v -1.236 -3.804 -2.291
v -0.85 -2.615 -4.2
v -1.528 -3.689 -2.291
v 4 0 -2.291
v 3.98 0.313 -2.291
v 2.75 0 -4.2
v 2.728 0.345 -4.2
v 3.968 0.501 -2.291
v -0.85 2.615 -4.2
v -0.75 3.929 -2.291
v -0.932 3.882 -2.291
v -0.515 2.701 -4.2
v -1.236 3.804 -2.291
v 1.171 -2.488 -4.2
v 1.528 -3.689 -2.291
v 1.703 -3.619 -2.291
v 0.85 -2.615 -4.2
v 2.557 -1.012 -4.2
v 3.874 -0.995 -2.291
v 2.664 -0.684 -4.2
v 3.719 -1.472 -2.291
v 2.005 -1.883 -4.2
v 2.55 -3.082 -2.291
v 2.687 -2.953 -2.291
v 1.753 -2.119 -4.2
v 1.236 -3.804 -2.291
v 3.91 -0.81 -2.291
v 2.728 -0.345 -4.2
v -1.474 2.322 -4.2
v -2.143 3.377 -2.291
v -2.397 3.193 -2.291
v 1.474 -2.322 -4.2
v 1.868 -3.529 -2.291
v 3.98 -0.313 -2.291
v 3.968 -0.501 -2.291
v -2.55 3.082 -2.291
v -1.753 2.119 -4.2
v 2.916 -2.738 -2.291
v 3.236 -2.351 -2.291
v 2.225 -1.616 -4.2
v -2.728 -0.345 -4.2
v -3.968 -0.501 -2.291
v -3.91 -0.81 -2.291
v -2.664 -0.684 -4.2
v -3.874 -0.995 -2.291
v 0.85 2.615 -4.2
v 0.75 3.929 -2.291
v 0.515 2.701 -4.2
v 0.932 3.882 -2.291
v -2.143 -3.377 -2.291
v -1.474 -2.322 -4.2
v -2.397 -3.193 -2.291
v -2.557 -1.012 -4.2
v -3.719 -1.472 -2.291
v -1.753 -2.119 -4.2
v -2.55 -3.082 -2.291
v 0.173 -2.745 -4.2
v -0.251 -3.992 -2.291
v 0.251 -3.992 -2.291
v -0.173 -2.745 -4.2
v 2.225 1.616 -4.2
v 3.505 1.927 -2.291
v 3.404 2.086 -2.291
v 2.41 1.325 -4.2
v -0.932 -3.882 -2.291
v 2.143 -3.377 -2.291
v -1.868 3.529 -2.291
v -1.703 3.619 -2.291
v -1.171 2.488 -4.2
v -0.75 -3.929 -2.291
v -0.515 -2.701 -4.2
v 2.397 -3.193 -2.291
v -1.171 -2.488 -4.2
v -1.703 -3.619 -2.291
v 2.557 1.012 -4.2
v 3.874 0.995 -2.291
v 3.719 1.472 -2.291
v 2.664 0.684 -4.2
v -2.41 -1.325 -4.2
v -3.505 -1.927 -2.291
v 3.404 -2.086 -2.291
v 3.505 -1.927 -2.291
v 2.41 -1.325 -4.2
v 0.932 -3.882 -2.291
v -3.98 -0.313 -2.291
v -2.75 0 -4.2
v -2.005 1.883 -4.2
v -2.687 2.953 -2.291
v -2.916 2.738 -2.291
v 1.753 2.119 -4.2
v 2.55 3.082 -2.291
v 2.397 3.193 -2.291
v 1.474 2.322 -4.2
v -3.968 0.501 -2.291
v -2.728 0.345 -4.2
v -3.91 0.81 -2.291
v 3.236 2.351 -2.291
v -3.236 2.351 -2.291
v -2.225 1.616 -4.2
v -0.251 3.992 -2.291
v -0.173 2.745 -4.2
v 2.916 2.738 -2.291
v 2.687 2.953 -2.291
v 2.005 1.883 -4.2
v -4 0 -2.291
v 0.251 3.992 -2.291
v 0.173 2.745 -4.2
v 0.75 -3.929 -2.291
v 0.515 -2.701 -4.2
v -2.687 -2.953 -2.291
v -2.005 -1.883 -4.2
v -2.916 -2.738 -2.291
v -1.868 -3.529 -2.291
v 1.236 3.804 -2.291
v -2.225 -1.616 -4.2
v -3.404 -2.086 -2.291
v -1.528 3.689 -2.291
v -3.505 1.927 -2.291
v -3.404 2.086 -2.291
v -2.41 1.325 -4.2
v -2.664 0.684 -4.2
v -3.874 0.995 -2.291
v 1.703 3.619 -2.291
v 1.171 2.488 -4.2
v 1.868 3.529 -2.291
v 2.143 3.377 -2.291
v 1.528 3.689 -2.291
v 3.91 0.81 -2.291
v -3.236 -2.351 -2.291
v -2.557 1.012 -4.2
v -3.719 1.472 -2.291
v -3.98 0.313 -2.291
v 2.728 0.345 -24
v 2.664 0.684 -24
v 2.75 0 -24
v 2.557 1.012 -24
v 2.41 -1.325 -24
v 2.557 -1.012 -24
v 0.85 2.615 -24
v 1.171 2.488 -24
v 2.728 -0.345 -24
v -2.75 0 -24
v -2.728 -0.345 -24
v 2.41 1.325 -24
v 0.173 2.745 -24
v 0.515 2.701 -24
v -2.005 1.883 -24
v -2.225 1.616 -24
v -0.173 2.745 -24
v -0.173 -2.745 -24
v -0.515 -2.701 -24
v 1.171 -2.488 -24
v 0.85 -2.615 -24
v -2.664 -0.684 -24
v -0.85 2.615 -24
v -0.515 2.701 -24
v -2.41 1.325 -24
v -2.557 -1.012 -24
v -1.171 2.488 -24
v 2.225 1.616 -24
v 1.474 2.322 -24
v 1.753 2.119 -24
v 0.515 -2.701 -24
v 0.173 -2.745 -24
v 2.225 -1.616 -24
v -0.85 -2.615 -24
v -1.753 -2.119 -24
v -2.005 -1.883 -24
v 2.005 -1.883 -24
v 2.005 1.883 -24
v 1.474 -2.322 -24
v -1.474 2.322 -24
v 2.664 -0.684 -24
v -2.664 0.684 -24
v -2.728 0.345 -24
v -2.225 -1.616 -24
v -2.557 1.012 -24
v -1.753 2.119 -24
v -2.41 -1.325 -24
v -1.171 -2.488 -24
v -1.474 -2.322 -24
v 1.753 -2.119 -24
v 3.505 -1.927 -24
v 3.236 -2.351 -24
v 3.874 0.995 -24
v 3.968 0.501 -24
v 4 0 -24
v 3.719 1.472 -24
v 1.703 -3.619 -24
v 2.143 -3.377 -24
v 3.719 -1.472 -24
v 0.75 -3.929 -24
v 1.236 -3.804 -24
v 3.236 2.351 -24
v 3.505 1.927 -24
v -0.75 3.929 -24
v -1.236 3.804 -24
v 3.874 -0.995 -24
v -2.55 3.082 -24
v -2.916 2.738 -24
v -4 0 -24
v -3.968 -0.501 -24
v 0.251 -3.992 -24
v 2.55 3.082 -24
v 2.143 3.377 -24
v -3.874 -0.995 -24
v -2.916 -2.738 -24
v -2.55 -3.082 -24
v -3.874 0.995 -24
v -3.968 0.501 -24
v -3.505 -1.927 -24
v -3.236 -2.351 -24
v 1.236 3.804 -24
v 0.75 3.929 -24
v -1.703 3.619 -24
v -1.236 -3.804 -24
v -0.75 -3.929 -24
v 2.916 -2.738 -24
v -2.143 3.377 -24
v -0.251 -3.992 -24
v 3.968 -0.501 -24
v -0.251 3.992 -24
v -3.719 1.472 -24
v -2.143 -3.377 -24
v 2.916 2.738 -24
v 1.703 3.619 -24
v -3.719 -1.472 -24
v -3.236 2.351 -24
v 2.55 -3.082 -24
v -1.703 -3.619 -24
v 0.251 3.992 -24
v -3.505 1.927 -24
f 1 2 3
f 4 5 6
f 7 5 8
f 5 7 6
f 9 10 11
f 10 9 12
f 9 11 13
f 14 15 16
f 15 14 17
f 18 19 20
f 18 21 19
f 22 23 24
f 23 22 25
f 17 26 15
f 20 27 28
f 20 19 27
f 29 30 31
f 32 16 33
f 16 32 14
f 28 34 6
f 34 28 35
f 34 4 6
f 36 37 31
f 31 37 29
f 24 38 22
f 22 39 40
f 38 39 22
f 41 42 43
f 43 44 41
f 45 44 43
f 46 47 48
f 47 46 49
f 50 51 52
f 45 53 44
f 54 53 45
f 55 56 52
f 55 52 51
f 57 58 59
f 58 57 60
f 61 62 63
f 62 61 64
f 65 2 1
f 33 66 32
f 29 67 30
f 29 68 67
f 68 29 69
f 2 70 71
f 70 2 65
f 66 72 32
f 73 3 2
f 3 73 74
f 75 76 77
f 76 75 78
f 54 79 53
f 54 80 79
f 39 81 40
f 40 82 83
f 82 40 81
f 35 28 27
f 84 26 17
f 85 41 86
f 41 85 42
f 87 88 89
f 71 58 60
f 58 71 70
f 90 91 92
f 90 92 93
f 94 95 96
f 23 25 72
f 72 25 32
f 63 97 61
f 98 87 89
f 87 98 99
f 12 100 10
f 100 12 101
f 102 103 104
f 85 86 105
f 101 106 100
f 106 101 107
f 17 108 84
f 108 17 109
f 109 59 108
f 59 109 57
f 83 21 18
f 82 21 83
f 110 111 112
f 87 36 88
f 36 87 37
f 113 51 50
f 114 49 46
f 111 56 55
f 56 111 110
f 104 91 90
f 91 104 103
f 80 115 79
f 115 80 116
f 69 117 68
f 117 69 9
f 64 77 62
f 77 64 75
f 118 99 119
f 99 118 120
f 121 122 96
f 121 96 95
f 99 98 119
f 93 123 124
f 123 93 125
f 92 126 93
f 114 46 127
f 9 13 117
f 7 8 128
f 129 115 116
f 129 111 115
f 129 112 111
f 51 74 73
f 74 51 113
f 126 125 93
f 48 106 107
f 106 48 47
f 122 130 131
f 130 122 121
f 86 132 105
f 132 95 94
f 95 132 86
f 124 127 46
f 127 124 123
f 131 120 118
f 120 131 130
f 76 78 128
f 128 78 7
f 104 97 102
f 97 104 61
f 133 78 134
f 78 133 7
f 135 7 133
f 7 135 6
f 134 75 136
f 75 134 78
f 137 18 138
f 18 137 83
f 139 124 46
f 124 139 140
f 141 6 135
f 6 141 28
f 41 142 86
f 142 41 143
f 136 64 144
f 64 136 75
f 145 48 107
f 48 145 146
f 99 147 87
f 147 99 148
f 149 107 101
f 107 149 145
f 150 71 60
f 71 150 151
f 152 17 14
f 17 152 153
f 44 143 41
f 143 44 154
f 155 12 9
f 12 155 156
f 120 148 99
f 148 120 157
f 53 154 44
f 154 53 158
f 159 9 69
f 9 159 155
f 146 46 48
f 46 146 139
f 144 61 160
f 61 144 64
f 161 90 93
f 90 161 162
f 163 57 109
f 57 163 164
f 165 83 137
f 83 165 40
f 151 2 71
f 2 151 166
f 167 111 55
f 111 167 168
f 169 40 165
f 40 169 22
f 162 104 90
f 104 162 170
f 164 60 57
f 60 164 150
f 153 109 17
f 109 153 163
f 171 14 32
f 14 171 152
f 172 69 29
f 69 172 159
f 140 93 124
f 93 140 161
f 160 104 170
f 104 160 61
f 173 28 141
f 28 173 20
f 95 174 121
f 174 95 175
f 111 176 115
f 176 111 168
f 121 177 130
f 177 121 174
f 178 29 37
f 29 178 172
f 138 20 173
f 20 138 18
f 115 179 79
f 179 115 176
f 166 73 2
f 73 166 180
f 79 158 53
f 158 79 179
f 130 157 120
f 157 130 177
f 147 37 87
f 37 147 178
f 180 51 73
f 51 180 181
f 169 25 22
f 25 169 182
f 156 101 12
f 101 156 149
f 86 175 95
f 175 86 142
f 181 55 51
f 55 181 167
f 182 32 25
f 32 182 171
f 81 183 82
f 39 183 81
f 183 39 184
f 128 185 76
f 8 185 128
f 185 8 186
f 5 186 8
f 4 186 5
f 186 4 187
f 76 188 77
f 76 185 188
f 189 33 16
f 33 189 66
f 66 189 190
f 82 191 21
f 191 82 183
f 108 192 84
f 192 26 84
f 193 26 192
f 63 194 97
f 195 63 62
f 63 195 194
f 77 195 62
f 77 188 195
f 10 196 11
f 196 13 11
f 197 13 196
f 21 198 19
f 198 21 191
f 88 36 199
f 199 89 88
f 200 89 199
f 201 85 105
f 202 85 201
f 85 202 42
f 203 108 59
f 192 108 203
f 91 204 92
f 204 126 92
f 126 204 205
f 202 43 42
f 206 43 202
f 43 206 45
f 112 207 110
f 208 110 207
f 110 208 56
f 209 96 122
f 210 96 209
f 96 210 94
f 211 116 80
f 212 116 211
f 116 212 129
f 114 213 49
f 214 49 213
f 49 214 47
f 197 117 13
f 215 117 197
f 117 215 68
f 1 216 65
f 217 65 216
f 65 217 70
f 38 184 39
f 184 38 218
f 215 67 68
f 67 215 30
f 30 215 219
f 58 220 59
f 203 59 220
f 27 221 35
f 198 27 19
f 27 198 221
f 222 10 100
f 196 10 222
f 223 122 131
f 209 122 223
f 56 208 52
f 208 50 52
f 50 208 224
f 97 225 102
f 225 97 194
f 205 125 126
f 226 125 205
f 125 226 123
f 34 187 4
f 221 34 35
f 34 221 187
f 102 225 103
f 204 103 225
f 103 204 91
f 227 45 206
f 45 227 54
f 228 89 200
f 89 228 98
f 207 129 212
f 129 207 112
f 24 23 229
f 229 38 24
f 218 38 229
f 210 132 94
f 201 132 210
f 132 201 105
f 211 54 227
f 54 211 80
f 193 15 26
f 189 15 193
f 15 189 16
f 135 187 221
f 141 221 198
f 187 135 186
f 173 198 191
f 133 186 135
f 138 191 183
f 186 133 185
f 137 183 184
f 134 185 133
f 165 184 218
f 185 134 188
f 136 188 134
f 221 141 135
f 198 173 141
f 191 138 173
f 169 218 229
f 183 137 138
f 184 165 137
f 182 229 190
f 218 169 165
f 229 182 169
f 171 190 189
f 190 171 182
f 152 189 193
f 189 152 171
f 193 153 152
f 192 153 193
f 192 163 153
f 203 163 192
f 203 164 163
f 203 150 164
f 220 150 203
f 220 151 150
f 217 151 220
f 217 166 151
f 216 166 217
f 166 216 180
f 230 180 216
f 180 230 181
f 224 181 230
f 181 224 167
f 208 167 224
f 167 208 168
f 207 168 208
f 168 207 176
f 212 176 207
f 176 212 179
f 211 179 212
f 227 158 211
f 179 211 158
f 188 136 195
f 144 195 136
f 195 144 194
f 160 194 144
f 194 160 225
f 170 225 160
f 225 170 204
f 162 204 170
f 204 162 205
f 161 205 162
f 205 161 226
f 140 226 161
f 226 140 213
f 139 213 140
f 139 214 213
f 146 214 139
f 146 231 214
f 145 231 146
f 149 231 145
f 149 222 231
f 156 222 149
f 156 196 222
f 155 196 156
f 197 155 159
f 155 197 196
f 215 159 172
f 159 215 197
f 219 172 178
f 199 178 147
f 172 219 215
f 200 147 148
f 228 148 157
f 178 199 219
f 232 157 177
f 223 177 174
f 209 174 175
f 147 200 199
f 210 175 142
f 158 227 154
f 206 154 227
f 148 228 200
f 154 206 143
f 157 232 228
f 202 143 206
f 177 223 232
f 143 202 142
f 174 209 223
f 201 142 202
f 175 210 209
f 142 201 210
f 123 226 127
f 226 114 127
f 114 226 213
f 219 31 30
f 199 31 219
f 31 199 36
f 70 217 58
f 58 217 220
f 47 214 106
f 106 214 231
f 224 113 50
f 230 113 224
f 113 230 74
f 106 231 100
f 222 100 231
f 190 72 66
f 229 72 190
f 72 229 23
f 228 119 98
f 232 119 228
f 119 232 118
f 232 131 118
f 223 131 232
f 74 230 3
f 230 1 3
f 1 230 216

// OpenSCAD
$fn = 50;

difference() {
	union() {
		translate(v = [0, 0, -24.0]) {
			cylinder(h = 27, r = 4.0);
		}
	}
	union() {
		translate(v = [0, 0, 0]) {
			rotate(a = [0, 0, 0]) {
				difference() {
					union() {
						translate(v = [0, 0, -27.0]) {
							cylinder(h = 27, r = 2.25);
						}
						translate(v = [0, 0, -4.2]) {
							cylinder(h = 4.2, r1 = 2.75, r2 = 5.5);
						}
						translate(v = [0, 0, -27.0]) {
							cylinder(h = 27, r = 2.75);
						}
						translate(v = [0, 0, -27.0]) {
							cylinder(h = 27, r = 2.25);
						}
					}
					union();
				}
			}
		}
		#cylinder(h = 3, r = 6.25);
	}
}
